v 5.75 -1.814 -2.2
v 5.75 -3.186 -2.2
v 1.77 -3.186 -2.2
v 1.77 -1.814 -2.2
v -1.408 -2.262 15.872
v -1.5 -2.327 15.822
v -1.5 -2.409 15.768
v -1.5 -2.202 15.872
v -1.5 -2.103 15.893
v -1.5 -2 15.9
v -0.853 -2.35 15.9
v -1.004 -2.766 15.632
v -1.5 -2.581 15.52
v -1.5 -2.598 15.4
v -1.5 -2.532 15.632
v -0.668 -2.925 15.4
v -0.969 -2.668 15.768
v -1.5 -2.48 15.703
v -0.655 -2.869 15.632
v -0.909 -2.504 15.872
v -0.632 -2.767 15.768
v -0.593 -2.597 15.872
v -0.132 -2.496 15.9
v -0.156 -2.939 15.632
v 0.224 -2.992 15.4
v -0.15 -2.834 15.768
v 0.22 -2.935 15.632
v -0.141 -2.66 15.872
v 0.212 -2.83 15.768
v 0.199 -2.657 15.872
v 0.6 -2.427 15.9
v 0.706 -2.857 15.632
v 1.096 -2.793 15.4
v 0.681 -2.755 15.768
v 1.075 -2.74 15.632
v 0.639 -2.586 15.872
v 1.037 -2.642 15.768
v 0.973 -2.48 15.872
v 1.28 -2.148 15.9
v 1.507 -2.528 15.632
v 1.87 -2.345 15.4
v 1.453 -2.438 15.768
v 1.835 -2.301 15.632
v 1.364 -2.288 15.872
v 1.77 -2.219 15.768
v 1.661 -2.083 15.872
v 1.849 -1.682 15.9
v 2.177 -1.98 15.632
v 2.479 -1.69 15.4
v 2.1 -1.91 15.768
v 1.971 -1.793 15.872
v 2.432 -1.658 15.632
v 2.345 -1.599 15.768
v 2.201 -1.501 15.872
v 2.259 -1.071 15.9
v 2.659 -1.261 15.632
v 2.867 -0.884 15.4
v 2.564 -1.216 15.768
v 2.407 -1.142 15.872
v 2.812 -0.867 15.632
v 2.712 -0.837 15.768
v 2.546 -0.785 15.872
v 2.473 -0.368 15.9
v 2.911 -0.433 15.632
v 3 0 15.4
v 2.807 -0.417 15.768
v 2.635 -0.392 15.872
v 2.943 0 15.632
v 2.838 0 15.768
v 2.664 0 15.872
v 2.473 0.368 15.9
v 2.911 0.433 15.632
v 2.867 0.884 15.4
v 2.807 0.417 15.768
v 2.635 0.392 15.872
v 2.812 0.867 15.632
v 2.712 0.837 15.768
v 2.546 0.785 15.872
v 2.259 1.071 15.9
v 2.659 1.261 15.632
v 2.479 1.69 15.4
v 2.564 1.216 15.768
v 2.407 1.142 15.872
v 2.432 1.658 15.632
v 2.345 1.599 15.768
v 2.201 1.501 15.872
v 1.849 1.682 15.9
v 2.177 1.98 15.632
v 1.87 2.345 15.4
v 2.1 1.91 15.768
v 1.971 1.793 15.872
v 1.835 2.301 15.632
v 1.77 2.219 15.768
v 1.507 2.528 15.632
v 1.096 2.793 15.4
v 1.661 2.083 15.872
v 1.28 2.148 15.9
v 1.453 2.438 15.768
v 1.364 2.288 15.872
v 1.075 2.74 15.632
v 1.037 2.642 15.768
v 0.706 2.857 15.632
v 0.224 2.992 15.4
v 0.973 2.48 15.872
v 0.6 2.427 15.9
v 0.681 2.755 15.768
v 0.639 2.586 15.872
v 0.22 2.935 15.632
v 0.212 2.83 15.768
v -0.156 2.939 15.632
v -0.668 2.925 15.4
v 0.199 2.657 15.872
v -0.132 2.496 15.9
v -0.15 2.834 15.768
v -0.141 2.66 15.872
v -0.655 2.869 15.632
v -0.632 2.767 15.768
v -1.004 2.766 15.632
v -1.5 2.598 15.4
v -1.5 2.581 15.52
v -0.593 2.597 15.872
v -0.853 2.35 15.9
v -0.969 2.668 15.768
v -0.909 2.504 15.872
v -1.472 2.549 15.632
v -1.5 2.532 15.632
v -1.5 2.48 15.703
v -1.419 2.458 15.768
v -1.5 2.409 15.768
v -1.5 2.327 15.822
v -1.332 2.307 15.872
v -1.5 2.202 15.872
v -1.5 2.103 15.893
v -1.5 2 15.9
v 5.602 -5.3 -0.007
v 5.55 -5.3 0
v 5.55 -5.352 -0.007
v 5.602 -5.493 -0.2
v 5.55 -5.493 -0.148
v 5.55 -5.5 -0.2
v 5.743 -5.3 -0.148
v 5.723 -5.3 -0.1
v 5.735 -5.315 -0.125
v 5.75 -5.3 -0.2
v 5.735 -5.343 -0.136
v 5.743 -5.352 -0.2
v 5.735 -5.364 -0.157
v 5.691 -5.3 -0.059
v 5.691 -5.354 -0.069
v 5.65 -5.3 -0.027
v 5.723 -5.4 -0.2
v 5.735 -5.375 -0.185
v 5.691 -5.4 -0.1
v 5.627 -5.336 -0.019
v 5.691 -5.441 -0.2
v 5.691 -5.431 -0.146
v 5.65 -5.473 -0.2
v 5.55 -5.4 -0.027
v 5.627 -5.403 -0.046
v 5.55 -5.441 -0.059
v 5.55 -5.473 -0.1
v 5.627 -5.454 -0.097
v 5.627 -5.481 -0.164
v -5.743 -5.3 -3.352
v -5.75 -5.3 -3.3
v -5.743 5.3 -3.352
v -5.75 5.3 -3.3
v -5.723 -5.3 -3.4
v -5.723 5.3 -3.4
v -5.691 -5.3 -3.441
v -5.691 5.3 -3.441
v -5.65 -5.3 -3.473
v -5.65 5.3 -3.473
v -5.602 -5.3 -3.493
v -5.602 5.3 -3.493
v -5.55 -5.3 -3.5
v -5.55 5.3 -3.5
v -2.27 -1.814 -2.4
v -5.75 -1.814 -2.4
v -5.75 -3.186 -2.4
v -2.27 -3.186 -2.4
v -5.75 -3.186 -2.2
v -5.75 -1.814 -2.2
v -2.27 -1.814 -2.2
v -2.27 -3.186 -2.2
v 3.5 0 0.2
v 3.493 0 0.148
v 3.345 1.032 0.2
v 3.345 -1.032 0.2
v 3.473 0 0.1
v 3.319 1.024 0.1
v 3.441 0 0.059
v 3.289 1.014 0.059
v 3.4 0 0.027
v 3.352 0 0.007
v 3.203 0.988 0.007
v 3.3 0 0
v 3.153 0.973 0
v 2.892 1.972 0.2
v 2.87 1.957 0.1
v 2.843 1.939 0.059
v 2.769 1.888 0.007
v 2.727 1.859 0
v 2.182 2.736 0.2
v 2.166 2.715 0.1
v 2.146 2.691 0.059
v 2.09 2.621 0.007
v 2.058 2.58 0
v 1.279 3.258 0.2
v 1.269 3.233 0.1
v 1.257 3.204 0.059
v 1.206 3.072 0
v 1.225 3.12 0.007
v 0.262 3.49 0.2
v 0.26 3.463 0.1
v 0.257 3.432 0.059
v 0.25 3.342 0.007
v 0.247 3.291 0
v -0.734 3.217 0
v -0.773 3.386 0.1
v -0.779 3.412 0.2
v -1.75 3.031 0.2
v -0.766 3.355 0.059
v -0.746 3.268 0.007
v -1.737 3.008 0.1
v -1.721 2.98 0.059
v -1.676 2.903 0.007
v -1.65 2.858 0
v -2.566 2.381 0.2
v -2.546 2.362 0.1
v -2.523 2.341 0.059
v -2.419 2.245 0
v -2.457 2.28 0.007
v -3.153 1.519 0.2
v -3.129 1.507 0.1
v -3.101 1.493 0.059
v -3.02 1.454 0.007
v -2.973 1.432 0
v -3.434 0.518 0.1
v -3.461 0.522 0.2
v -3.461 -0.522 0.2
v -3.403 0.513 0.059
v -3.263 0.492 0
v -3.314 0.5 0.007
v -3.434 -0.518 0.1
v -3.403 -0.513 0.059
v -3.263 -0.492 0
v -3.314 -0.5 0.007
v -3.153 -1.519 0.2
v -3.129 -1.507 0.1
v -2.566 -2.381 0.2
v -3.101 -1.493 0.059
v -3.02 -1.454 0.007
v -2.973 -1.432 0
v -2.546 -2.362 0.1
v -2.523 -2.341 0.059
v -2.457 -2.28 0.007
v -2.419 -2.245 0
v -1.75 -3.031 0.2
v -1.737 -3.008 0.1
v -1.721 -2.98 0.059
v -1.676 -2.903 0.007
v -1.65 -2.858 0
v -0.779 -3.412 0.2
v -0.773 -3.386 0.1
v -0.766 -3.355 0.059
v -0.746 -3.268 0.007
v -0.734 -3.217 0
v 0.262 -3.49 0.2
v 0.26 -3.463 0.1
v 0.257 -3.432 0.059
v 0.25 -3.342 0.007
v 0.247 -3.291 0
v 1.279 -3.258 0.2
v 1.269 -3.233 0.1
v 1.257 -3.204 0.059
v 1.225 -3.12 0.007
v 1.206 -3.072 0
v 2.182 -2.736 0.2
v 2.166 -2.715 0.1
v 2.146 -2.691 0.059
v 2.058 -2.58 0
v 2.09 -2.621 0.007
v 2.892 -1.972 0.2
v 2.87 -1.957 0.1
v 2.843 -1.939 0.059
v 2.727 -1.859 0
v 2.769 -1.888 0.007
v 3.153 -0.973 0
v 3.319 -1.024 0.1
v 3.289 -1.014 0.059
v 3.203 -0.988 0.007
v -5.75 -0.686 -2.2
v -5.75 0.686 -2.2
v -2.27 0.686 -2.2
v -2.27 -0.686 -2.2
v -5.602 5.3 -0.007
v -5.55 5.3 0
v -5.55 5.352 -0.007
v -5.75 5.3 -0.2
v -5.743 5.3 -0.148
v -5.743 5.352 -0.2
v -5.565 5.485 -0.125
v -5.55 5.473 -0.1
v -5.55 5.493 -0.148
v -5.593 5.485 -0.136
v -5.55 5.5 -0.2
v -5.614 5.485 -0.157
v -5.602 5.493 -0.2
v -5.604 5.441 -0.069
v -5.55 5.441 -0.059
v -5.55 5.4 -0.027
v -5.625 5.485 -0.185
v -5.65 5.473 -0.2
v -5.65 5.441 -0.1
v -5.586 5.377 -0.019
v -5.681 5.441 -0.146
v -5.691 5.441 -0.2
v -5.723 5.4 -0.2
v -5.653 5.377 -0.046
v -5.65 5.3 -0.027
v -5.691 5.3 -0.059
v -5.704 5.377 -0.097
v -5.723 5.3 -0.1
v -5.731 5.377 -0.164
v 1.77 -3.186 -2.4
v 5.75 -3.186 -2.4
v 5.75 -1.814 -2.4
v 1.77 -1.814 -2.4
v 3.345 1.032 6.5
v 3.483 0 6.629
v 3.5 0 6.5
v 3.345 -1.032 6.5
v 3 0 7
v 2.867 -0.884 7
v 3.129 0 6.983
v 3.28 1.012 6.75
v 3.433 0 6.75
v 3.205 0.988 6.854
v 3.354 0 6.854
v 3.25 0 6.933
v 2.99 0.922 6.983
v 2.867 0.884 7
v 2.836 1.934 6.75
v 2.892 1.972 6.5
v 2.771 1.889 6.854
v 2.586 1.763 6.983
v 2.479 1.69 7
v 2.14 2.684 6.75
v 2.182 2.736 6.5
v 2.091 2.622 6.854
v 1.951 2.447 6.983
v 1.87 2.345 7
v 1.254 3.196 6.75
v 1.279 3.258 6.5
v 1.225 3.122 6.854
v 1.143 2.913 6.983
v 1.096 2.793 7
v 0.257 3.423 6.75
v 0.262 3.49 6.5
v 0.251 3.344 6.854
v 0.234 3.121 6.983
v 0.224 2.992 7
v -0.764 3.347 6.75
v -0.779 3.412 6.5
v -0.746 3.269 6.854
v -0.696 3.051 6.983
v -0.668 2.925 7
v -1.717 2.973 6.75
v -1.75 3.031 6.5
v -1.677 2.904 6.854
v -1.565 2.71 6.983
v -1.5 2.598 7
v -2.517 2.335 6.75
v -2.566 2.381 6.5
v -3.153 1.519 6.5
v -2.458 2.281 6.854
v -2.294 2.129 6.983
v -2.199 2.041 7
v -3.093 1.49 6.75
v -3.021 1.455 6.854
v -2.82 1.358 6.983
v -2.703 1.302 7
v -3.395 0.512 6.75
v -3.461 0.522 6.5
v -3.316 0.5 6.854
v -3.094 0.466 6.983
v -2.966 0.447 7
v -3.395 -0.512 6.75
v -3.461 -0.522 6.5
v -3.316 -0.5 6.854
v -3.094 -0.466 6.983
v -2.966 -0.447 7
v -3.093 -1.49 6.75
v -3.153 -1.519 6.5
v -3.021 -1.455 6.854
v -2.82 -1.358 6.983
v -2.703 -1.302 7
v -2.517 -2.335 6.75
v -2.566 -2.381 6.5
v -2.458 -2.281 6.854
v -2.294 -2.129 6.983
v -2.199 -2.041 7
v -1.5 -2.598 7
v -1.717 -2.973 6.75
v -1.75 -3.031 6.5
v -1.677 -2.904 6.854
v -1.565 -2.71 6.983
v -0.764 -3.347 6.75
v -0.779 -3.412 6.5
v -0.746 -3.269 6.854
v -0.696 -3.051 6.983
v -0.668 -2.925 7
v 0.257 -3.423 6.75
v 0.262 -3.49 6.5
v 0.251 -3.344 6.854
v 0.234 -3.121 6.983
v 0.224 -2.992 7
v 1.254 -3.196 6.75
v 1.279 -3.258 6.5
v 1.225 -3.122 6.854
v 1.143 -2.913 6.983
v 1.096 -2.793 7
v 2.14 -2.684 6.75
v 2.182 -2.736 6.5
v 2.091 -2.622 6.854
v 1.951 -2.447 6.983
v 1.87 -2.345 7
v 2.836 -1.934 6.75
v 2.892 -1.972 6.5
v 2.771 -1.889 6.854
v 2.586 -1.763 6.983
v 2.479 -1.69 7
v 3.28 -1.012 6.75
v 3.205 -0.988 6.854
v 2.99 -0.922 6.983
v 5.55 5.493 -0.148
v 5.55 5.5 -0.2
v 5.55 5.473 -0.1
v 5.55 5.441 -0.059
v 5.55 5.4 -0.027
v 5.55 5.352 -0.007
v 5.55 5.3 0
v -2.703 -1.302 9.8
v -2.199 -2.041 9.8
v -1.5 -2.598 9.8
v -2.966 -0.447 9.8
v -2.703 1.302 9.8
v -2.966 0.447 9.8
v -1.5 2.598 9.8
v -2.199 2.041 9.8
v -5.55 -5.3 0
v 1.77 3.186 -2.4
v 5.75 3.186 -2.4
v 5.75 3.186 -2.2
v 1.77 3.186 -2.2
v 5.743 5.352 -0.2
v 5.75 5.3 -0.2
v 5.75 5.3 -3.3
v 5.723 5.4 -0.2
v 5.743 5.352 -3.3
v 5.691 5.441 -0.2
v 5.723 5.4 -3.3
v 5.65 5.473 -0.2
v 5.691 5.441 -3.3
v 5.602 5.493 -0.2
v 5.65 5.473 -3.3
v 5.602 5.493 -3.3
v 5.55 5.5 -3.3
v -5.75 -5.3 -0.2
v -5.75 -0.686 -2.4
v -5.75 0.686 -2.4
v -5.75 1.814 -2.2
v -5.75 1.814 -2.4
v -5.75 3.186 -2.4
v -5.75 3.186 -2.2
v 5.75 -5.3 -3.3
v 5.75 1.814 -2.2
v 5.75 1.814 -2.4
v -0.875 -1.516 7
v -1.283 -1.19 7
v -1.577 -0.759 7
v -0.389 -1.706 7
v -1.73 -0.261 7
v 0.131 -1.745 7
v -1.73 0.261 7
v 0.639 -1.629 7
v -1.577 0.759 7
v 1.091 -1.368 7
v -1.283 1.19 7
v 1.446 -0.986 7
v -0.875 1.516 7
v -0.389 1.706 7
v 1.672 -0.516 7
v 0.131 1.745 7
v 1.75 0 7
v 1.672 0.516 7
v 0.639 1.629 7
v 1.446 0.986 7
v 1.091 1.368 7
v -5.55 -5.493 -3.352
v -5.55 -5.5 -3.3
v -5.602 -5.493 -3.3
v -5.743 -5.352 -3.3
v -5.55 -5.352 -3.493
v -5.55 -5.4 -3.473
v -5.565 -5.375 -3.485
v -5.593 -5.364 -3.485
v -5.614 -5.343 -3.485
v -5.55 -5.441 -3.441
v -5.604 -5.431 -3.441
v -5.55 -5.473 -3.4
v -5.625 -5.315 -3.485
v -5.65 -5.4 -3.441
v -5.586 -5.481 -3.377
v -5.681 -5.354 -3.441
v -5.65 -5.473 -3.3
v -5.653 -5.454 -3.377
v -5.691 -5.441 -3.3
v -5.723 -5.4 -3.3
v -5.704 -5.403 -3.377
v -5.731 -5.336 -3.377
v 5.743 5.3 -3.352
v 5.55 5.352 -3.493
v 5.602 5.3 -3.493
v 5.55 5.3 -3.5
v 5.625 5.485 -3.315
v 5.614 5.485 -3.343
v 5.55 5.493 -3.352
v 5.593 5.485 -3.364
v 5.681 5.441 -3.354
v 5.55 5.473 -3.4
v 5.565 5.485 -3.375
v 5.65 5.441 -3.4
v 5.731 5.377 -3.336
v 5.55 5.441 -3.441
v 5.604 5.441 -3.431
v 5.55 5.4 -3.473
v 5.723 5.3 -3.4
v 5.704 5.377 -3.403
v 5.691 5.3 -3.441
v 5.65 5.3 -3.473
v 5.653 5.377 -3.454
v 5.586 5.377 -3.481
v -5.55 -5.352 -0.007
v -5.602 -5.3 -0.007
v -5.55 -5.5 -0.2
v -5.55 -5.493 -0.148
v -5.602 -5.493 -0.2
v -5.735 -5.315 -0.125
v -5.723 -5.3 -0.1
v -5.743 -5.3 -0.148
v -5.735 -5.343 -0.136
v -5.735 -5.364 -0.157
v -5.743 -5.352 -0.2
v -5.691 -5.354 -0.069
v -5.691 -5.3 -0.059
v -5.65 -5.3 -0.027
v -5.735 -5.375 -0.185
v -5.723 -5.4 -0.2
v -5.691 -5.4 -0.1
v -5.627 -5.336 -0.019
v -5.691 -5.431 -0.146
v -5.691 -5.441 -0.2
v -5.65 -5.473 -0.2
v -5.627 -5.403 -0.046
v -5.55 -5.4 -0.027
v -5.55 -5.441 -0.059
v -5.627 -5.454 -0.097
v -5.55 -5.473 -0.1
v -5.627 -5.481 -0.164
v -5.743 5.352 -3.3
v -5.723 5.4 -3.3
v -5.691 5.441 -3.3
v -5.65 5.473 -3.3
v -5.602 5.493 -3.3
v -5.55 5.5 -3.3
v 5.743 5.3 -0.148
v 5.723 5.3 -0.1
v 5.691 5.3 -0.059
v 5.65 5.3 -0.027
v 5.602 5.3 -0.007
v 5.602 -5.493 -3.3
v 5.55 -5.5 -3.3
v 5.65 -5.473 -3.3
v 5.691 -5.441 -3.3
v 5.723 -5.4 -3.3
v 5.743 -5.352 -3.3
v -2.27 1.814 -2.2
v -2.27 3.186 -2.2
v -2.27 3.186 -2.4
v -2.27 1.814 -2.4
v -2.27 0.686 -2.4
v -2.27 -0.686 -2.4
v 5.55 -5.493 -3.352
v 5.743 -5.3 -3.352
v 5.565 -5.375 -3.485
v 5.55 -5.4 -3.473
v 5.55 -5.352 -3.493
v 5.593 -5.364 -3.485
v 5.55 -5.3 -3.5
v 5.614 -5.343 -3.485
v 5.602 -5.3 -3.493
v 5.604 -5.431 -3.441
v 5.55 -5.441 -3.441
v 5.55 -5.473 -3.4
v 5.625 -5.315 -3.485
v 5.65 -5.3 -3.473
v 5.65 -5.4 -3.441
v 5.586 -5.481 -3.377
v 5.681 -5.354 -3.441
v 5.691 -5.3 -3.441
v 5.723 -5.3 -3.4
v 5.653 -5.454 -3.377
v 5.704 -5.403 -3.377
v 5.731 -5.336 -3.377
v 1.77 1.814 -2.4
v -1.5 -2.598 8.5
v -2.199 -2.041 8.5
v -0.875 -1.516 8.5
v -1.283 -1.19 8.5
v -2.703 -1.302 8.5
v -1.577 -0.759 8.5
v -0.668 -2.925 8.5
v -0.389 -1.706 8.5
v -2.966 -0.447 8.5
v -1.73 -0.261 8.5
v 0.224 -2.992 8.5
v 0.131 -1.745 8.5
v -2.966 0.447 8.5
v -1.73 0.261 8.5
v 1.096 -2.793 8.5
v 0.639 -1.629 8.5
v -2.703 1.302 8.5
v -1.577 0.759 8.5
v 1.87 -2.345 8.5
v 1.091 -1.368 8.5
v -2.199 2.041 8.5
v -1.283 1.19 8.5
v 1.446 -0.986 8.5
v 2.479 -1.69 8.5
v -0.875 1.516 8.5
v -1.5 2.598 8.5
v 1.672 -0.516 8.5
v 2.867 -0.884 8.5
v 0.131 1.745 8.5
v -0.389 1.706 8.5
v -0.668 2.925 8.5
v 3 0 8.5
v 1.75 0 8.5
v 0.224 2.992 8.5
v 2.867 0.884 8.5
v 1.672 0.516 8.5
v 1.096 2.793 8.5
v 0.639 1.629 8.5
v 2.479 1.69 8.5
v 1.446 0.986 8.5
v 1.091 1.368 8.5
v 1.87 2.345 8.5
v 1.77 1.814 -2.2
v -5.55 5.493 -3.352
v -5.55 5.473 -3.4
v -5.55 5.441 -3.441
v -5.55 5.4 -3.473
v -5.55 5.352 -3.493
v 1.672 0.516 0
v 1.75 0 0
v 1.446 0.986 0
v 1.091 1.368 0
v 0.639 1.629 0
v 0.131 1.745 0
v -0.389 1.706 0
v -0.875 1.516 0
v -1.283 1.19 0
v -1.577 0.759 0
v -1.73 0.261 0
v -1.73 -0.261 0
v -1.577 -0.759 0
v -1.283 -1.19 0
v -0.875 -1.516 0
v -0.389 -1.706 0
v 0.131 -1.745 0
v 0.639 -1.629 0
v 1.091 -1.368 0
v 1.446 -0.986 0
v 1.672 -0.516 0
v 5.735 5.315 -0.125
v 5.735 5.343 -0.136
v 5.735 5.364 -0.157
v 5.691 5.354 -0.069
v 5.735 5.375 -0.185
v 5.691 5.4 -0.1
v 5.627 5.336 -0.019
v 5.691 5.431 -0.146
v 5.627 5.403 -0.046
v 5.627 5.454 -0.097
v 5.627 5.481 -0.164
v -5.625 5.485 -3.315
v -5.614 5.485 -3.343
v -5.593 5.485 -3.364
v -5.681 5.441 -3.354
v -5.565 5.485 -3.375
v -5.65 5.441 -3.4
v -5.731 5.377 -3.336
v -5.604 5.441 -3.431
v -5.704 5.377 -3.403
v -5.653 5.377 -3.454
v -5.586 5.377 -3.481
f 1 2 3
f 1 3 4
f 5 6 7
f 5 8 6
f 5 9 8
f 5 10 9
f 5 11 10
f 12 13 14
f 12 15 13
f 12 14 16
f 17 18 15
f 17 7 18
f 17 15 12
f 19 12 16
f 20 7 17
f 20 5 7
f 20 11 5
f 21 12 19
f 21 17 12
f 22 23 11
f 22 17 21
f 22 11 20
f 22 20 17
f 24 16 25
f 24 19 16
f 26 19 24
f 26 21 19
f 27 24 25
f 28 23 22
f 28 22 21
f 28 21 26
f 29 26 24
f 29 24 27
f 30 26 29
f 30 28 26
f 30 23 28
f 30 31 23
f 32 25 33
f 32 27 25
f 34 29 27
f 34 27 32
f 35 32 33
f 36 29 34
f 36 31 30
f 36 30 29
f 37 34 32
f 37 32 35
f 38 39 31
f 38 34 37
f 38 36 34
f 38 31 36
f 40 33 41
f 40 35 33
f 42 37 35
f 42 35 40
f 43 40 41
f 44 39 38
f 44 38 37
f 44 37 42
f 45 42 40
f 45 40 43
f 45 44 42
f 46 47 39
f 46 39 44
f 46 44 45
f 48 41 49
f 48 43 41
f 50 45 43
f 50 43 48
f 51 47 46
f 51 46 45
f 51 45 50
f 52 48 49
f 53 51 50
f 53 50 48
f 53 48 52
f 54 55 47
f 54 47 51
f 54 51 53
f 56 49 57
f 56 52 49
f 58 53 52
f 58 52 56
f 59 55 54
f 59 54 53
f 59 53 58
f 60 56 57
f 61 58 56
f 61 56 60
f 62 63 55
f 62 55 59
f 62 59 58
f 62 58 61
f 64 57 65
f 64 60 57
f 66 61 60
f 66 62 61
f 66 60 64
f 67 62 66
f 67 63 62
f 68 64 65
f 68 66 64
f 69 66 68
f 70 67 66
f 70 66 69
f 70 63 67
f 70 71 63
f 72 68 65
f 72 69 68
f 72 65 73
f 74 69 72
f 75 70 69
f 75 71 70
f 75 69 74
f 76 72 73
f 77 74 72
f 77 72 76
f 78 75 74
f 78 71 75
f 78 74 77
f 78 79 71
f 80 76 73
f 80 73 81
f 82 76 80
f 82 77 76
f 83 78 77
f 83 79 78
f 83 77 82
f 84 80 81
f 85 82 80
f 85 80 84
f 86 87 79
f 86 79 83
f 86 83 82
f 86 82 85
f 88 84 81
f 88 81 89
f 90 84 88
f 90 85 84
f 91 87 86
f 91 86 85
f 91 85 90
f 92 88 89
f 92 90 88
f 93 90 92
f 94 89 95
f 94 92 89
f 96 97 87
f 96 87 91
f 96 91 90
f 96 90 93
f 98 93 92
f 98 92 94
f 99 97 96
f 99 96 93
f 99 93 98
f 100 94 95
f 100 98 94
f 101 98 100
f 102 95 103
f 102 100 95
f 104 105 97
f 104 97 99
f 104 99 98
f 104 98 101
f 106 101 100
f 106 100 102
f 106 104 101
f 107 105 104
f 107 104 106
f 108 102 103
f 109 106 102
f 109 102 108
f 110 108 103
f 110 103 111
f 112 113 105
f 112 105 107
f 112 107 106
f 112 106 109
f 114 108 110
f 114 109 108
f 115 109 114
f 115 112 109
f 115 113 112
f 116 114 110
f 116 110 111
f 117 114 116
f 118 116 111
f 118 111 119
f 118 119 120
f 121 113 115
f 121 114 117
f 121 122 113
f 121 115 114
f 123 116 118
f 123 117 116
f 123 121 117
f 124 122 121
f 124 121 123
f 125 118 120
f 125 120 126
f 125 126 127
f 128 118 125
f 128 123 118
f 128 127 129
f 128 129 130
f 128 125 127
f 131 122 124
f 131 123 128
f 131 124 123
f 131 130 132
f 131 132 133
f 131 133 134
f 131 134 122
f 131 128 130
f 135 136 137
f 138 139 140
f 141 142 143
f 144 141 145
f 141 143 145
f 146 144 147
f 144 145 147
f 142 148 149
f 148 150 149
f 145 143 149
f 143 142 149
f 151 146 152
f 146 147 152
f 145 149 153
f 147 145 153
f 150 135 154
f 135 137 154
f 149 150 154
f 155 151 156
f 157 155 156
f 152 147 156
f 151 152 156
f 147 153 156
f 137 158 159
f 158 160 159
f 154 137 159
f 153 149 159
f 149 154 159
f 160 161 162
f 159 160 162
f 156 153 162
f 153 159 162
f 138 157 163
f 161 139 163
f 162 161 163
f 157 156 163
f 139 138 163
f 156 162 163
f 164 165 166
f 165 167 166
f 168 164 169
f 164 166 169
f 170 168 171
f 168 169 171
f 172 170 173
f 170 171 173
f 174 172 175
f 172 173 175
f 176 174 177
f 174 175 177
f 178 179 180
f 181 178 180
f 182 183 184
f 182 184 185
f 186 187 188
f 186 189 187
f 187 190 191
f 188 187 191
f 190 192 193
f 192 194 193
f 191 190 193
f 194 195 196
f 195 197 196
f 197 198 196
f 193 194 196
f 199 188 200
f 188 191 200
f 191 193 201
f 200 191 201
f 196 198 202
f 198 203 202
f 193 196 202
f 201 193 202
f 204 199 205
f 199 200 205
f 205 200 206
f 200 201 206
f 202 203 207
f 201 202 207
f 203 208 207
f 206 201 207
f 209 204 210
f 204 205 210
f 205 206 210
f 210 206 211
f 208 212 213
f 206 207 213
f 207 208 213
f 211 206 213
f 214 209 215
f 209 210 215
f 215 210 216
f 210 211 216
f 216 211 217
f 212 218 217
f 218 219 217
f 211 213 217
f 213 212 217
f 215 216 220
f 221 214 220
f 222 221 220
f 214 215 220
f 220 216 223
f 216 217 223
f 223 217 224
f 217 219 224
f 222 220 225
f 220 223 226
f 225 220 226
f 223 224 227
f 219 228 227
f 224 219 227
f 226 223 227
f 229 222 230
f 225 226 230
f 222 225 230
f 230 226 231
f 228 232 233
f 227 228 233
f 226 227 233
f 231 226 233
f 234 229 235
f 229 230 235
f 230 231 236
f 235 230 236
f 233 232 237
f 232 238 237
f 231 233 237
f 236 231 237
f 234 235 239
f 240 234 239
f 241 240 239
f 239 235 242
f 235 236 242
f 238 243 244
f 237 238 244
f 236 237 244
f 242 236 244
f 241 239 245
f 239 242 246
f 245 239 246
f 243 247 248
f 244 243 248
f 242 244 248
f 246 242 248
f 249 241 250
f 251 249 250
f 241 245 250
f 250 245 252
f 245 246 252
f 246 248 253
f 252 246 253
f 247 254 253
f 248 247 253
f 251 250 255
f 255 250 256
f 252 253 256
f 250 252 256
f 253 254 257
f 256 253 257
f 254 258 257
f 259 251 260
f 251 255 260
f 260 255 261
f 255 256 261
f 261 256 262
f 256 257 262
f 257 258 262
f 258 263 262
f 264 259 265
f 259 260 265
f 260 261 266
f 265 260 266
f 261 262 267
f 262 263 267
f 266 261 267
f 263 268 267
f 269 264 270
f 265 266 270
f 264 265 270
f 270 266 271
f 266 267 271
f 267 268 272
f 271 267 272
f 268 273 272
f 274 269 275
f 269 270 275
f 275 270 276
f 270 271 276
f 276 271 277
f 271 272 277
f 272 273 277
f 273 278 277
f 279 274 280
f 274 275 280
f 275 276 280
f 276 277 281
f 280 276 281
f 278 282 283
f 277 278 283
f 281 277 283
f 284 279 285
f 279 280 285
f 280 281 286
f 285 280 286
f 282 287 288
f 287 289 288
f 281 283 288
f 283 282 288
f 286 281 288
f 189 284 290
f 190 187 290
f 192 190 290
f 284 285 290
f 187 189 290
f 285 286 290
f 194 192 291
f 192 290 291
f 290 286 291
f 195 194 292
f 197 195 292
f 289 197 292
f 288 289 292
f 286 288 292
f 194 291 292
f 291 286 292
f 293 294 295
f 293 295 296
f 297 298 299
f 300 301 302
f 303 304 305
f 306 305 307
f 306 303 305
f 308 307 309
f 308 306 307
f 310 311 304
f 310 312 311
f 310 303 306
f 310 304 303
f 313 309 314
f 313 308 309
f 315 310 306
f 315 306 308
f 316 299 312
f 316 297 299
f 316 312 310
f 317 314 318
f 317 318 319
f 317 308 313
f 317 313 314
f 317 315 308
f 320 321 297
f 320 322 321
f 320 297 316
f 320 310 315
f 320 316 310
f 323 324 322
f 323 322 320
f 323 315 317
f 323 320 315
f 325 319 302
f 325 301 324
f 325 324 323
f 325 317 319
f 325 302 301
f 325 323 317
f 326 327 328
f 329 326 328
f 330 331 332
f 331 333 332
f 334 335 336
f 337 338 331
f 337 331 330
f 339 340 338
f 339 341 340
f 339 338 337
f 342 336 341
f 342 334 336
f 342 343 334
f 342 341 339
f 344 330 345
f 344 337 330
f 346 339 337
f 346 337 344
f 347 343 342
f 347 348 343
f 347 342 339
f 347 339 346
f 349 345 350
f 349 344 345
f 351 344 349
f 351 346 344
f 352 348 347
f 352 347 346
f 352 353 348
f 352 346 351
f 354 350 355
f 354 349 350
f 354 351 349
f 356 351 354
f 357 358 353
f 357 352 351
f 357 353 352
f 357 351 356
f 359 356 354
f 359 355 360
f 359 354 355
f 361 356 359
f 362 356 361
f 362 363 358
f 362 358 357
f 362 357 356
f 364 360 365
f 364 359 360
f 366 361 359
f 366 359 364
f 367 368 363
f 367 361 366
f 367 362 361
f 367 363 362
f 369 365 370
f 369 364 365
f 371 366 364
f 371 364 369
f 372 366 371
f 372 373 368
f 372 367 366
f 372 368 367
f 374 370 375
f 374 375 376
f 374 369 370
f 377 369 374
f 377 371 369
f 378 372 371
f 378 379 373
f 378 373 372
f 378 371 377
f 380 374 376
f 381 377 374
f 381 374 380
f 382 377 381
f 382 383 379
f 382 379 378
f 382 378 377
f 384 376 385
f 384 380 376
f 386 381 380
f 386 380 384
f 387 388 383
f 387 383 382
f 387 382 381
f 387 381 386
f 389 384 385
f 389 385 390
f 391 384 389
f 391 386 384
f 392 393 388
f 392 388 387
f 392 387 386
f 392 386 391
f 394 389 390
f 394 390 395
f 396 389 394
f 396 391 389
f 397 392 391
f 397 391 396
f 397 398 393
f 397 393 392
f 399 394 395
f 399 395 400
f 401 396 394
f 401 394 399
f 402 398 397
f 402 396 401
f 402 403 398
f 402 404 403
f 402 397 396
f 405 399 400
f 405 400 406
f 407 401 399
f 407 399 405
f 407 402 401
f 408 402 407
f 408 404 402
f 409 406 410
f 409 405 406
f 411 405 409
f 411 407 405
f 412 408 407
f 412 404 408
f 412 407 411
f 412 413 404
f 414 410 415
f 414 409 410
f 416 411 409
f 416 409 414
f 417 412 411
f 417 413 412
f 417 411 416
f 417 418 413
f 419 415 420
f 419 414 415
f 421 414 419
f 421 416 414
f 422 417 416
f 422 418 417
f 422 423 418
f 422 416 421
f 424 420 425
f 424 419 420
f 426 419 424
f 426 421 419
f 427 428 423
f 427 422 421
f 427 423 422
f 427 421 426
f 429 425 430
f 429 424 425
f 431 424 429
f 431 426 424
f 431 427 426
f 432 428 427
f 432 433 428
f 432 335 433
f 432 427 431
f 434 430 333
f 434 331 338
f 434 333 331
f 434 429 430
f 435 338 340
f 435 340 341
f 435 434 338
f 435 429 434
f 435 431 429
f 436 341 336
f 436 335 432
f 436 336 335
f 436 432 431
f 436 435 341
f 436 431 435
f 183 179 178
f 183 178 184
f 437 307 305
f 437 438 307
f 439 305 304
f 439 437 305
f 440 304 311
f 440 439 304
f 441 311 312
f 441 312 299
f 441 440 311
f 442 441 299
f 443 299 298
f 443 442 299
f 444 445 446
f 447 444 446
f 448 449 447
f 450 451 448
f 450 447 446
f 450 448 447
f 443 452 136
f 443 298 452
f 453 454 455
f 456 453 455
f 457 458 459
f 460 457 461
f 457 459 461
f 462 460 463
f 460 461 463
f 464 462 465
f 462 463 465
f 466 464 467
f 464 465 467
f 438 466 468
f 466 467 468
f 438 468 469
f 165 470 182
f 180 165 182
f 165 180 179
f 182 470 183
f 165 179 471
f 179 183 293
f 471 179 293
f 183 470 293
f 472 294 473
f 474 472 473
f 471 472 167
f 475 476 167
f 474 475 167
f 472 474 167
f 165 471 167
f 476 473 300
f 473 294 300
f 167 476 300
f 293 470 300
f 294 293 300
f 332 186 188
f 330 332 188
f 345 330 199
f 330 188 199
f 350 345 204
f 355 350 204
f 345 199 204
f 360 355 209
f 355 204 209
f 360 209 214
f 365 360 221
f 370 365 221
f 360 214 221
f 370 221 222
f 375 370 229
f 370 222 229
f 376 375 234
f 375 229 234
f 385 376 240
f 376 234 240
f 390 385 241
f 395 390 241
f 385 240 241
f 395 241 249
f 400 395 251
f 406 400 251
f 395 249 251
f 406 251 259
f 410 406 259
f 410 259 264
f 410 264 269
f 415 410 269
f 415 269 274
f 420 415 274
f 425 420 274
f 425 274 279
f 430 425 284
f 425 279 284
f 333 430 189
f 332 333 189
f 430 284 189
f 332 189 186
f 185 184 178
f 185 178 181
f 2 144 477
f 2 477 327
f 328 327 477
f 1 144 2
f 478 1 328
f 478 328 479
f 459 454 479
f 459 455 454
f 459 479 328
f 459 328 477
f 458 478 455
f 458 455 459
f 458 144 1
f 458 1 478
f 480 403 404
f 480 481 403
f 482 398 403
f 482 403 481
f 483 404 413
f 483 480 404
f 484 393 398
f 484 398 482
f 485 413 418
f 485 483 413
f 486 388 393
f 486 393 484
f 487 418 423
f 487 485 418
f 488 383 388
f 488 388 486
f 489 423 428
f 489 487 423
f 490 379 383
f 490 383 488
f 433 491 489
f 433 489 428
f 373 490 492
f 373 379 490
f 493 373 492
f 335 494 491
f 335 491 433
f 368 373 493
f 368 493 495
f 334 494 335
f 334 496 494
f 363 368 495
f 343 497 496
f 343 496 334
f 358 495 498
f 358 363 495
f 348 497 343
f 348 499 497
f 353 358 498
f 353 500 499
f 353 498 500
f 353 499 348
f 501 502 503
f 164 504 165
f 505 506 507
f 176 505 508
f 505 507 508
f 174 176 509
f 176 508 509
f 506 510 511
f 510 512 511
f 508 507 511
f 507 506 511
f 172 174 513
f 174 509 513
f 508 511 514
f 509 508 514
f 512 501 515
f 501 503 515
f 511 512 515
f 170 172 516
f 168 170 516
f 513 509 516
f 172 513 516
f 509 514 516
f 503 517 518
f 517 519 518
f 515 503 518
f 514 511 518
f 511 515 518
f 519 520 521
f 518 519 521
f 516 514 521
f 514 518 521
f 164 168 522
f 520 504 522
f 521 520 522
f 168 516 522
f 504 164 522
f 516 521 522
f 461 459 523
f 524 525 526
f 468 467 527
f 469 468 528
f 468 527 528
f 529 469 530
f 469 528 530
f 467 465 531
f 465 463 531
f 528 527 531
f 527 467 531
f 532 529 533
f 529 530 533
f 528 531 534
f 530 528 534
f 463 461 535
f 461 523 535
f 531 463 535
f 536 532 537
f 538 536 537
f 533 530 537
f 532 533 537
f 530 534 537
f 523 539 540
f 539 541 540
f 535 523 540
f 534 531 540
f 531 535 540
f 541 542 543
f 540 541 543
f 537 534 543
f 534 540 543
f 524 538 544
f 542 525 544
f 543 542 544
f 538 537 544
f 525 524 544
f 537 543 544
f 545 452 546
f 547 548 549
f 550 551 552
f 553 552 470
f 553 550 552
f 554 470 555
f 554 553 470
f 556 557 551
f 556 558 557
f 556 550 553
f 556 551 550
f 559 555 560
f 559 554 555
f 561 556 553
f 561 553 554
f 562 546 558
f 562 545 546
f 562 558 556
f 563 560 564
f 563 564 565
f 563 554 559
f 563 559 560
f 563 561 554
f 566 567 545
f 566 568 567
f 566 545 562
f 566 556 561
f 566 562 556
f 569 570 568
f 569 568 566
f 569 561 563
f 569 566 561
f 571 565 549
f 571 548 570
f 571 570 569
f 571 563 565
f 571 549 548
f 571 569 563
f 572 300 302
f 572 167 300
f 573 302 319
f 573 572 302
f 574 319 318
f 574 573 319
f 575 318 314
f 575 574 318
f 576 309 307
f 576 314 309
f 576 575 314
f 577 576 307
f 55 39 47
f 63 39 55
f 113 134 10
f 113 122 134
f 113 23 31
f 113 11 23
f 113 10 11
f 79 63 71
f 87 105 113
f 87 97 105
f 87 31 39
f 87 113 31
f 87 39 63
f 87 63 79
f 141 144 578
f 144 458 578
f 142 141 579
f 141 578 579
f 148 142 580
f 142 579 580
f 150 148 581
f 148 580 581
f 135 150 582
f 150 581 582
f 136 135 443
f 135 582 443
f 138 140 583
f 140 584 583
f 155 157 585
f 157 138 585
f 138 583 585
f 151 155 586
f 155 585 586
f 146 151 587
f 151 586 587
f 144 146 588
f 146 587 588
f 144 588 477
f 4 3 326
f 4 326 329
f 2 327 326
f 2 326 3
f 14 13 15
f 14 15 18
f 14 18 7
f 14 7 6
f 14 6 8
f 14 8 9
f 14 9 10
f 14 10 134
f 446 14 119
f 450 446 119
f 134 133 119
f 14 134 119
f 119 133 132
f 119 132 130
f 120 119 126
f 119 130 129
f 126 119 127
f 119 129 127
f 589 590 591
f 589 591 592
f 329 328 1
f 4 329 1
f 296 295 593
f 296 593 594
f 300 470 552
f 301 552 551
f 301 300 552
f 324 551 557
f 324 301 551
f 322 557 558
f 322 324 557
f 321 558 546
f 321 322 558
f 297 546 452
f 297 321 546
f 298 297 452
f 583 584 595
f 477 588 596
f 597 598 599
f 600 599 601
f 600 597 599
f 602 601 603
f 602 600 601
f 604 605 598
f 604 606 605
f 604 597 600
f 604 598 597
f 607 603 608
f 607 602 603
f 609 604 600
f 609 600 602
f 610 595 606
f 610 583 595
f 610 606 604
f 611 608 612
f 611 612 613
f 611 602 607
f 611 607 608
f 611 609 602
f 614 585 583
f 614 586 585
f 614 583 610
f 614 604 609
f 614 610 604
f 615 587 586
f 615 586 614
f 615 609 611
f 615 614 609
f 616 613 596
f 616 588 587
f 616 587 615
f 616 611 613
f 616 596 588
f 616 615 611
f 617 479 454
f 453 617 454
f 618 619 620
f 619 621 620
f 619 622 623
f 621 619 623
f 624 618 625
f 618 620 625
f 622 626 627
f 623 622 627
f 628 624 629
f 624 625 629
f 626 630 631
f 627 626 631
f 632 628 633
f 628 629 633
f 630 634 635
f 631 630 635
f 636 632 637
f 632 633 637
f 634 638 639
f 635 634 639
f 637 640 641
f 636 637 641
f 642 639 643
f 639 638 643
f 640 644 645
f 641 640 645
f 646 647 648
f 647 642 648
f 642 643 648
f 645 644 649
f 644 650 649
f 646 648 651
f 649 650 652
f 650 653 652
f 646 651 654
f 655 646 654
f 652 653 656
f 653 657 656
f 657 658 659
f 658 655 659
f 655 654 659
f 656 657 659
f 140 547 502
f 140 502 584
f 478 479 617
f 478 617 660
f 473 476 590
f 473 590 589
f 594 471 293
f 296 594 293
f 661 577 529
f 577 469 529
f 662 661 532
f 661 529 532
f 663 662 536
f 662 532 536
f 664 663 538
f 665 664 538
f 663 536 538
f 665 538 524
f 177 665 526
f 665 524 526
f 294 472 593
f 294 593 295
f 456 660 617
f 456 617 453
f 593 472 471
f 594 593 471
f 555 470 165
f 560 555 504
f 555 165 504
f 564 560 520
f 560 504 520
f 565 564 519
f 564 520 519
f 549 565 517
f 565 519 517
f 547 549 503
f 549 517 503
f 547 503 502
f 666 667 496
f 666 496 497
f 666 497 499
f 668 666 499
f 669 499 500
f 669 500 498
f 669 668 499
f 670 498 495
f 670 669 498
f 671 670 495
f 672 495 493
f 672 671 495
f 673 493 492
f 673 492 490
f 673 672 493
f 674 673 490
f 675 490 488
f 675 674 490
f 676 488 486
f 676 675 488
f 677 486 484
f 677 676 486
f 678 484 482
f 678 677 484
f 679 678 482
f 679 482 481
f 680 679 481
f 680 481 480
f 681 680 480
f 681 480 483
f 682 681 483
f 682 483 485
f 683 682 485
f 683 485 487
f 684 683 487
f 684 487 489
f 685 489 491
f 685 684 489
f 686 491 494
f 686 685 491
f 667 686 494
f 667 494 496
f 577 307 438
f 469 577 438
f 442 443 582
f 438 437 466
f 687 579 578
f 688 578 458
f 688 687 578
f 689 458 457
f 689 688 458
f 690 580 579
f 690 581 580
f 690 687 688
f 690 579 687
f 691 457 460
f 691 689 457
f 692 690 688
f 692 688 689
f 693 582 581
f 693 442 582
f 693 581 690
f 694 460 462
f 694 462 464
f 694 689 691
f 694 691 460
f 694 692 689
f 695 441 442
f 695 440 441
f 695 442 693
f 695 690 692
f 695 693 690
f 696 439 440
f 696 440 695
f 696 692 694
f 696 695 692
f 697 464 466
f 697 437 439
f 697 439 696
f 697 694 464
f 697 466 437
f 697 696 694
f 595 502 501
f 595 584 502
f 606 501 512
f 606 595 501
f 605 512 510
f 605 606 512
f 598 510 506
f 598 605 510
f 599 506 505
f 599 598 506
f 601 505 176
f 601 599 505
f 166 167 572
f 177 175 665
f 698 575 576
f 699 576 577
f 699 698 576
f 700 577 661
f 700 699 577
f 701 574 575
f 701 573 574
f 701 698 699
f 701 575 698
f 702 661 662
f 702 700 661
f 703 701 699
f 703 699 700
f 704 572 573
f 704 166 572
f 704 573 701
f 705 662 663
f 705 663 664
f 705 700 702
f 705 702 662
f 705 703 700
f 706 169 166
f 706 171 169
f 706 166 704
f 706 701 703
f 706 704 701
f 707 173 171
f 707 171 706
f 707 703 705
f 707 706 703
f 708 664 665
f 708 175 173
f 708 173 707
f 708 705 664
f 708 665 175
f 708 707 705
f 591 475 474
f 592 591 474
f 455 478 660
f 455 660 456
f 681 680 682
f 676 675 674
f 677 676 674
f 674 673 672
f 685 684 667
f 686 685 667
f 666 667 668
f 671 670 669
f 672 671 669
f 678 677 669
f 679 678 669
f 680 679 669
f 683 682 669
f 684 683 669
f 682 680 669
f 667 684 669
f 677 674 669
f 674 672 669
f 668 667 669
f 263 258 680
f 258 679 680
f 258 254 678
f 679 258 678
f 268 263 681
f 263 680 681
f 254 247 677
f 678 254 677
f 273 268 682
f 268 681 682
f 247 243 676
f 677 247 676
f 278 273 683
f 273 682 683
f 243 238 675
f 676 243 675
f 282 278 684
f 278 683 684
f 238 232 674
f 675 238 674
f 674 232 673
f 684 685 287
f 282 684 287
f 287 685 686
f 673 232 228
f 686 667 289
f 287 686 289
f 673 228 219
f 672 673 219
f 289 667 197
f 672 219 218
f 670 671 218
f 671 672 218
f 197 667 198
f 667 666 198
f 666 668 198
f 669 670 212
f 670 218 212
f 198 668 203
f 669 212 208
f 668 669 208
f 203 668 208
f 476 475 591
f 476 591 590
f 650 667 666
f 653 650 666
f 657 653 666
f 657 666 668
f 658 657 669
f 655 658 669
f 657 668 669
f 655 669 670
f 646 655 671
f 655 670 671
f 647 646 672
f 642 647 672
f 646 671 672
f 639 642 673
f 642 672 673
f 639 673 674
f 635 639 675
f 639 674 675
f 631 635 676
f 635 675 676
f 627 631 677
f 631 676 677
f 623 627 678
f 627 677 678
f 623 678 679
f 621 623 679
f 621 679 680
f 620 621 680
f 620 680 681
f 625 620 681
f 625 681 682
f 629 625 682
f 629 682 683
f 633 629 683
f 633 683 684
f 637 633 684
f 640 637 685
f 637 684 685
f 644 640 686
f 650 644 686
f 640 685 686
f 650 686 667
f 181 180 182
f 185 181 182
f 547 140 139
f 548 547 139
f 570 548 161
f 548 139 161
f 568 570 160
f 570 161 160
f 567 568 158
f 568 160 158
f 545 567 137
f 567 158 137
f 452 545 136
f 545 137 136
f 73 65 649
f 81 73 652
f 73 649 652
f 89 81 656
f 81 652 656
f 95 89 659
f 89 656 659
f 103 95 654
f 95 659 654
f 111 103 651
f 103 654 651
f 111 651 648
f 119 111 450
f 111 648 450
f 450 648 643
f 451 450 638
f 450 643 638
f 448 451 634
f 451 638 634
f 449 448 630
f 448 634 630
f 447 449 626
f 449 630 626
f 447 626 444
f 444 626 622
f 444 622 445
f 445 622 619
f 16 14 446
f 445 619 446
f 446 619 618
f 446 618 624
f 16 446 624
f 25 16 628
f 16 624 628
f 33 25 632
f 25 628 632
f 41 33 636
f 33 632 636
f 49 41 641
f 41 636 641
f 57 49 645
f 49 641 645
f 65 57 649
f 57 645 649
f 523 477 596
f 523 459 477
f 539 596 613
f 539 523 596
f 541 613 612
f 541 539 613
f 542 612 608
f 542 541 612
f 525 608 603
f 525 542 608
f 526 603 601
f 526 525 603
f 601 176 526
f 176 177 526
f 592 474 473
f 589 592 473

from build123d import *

# Parameters (mm, degrees)
F0_W      = 11.5
F0_H      = 11
F1_DEPTH  = 3.5
F2_R      = 3.5
F2_R_2    = 1.75
F3_DEPTH  = 7
F4_DEPTH  = 8.5
F5_R      = 3
F5_R_2    = 1.75
F6_DEPTH  = 7.4
F8_DEPTH  = 6
F9_R      = 0.2
F9_2_R    = 0.2
F10_R     = 0.5
F10_2_R   = 0.5
F11_DEPTH = 6.1
F12_W     = 1.372
F12_H     = 0.2
F13_DEPTH = 3.48
F14_W     = 1.372
F14_H     = 0.2
F15_DEPTH = 3.98


with BuildPart() as f1:
    # F0 (on Top) → F1 (new body)
    with BuildSketch(Plane.XY):
        Rectangle(F0_W, F0_H)
    extrude(amount=-F1_DEPTH)

    # F9
    f9_edges = [f1.edges().sort_by_distance(p)[0] for p in [
        (0, -5.5, 0),
        (-5.75, 0, 0),
        (0, 5.5, 0),
        (5.75, 0, 0),
        (5.75, -5.5, -1.75),
        (-5.75, -5.5, -1.75),
        (0, -5.5, -3.5),
        (-5.75, 0, -3.5),
        (5.75, 0, -3.5),
        (5.75, 5.5, -1.75),
        (-5.75, 5.5, -1.75),
        (0, 5.5, -3.5),
    ]]
    fillet(f9_edges, radius=F9_R)

    # F12 (on face) → F13 (cut)
    with BuildSketch(Plane(origin=(-5.75, 0, 0), x_dir=(0, -1, 0), z_dir=(-1, 0, 0))):
        with Locations((-2.5, -2.3)):
            Rectangle(F12_W, F12_H)
        with Locations((0, -2.3)):
            Rectangle(F12_W, F12_H)
        with Locations((2.5, -2.3)):
            Rectangle(F12_W, F12_H)
    extrude(amount=-F13_DEPTH, mode=Mode.SUBTRACT)

    # F14 (on face) → F15 (cut)
    with BuildSketch(Plane.YZ.offset(5.75)):
        with Locations((-2.5, -2.3)):
            Rectangle(F14_W, F14_H)
        with Locations((2.5, -2.3)):
            Rectangle(F14_W, F14_H)
    extrude(amount=-F15_DEPTH, mode=Mode.SUBTRACT)


with BuildPart() as f3:
    # F2 (on face) → F3 (new body)
    with BuildSketch(Plane.XY):
        Circle(F2_R)
        Circle(F2_R_2, mode=Mode.SUBTRACT)
    extrude(amount=F3_DEPTH)

    # F9#2
    f9_2_edges = [f3.edges().sort_by_distance(p)[0] for p in [
        (-3.5, 0, 0),
    ]]
    fillet(f9_2_edges, radius=F9_2_R)

    # F10#2
    f10_2_edges = [f3.edges().sort_by_distance(p)[0] for p in [
        (-3.5, 0, 7),
    ]]
    fillet(f10_2_edges, radius=F10_2_R)


with BuildPart() as f4:
    # F2 (on face) → F4 (new body)
    with BuildSketch(Plane.XY):
        Circle(F2_R_2)
    extrude(amount=F4_DEPTH)

    # F5 (on face) → F6 (join)
    with BuildSketch(Plane.XY.offset(8.5)):
        Circle(F5_R)
        Circle(F5_R_2, mode=Mode.SUBTRACT)
        Circle(F5_R_2)
    extrude(amount=F6_DEPTH)

    # F7 (on face) → F8 (cut)
    with BuildSketch(Plane.XY.offset(15.9)):
        with BuildLine():
            Line((-1.5, -2.5980762114), (-1.5, 2.5980762114))
            ThreePointArc((-1.5, 2.5980762114), (-3, 0), (-1.5, -2.5980762114))
        make_face()
    extrude(amount=-F8_DEPTH, mode=Mode.SUBTRACT)

    # F10
    f10_edges = [f4.edges().sort_by_distance(p)[0] for p in [
        (1.5, -2.598076, 15.9),
        (1.5, 2.598076, 15.9),
    ]]
    fillet(f10_edges, radius=F10_R)

    # F7 (on face) → F11 (cut)
    with BuildSketch(Plane.XY.offset(15.9)):
        with BuildLine():
            Line((-1.5, -2.5980762114), (-1.5, 2.5980762114))
            ThreePointArc((-1.5, 2.5980762114), (-3, 0), (-1.5, -2.5980762114))
        make_face()
    extrude(amount=-F11_DEPTH, mode=Mode.SUBTRACT)


solid = Compound([f1.part, f3.part, f4.part])
